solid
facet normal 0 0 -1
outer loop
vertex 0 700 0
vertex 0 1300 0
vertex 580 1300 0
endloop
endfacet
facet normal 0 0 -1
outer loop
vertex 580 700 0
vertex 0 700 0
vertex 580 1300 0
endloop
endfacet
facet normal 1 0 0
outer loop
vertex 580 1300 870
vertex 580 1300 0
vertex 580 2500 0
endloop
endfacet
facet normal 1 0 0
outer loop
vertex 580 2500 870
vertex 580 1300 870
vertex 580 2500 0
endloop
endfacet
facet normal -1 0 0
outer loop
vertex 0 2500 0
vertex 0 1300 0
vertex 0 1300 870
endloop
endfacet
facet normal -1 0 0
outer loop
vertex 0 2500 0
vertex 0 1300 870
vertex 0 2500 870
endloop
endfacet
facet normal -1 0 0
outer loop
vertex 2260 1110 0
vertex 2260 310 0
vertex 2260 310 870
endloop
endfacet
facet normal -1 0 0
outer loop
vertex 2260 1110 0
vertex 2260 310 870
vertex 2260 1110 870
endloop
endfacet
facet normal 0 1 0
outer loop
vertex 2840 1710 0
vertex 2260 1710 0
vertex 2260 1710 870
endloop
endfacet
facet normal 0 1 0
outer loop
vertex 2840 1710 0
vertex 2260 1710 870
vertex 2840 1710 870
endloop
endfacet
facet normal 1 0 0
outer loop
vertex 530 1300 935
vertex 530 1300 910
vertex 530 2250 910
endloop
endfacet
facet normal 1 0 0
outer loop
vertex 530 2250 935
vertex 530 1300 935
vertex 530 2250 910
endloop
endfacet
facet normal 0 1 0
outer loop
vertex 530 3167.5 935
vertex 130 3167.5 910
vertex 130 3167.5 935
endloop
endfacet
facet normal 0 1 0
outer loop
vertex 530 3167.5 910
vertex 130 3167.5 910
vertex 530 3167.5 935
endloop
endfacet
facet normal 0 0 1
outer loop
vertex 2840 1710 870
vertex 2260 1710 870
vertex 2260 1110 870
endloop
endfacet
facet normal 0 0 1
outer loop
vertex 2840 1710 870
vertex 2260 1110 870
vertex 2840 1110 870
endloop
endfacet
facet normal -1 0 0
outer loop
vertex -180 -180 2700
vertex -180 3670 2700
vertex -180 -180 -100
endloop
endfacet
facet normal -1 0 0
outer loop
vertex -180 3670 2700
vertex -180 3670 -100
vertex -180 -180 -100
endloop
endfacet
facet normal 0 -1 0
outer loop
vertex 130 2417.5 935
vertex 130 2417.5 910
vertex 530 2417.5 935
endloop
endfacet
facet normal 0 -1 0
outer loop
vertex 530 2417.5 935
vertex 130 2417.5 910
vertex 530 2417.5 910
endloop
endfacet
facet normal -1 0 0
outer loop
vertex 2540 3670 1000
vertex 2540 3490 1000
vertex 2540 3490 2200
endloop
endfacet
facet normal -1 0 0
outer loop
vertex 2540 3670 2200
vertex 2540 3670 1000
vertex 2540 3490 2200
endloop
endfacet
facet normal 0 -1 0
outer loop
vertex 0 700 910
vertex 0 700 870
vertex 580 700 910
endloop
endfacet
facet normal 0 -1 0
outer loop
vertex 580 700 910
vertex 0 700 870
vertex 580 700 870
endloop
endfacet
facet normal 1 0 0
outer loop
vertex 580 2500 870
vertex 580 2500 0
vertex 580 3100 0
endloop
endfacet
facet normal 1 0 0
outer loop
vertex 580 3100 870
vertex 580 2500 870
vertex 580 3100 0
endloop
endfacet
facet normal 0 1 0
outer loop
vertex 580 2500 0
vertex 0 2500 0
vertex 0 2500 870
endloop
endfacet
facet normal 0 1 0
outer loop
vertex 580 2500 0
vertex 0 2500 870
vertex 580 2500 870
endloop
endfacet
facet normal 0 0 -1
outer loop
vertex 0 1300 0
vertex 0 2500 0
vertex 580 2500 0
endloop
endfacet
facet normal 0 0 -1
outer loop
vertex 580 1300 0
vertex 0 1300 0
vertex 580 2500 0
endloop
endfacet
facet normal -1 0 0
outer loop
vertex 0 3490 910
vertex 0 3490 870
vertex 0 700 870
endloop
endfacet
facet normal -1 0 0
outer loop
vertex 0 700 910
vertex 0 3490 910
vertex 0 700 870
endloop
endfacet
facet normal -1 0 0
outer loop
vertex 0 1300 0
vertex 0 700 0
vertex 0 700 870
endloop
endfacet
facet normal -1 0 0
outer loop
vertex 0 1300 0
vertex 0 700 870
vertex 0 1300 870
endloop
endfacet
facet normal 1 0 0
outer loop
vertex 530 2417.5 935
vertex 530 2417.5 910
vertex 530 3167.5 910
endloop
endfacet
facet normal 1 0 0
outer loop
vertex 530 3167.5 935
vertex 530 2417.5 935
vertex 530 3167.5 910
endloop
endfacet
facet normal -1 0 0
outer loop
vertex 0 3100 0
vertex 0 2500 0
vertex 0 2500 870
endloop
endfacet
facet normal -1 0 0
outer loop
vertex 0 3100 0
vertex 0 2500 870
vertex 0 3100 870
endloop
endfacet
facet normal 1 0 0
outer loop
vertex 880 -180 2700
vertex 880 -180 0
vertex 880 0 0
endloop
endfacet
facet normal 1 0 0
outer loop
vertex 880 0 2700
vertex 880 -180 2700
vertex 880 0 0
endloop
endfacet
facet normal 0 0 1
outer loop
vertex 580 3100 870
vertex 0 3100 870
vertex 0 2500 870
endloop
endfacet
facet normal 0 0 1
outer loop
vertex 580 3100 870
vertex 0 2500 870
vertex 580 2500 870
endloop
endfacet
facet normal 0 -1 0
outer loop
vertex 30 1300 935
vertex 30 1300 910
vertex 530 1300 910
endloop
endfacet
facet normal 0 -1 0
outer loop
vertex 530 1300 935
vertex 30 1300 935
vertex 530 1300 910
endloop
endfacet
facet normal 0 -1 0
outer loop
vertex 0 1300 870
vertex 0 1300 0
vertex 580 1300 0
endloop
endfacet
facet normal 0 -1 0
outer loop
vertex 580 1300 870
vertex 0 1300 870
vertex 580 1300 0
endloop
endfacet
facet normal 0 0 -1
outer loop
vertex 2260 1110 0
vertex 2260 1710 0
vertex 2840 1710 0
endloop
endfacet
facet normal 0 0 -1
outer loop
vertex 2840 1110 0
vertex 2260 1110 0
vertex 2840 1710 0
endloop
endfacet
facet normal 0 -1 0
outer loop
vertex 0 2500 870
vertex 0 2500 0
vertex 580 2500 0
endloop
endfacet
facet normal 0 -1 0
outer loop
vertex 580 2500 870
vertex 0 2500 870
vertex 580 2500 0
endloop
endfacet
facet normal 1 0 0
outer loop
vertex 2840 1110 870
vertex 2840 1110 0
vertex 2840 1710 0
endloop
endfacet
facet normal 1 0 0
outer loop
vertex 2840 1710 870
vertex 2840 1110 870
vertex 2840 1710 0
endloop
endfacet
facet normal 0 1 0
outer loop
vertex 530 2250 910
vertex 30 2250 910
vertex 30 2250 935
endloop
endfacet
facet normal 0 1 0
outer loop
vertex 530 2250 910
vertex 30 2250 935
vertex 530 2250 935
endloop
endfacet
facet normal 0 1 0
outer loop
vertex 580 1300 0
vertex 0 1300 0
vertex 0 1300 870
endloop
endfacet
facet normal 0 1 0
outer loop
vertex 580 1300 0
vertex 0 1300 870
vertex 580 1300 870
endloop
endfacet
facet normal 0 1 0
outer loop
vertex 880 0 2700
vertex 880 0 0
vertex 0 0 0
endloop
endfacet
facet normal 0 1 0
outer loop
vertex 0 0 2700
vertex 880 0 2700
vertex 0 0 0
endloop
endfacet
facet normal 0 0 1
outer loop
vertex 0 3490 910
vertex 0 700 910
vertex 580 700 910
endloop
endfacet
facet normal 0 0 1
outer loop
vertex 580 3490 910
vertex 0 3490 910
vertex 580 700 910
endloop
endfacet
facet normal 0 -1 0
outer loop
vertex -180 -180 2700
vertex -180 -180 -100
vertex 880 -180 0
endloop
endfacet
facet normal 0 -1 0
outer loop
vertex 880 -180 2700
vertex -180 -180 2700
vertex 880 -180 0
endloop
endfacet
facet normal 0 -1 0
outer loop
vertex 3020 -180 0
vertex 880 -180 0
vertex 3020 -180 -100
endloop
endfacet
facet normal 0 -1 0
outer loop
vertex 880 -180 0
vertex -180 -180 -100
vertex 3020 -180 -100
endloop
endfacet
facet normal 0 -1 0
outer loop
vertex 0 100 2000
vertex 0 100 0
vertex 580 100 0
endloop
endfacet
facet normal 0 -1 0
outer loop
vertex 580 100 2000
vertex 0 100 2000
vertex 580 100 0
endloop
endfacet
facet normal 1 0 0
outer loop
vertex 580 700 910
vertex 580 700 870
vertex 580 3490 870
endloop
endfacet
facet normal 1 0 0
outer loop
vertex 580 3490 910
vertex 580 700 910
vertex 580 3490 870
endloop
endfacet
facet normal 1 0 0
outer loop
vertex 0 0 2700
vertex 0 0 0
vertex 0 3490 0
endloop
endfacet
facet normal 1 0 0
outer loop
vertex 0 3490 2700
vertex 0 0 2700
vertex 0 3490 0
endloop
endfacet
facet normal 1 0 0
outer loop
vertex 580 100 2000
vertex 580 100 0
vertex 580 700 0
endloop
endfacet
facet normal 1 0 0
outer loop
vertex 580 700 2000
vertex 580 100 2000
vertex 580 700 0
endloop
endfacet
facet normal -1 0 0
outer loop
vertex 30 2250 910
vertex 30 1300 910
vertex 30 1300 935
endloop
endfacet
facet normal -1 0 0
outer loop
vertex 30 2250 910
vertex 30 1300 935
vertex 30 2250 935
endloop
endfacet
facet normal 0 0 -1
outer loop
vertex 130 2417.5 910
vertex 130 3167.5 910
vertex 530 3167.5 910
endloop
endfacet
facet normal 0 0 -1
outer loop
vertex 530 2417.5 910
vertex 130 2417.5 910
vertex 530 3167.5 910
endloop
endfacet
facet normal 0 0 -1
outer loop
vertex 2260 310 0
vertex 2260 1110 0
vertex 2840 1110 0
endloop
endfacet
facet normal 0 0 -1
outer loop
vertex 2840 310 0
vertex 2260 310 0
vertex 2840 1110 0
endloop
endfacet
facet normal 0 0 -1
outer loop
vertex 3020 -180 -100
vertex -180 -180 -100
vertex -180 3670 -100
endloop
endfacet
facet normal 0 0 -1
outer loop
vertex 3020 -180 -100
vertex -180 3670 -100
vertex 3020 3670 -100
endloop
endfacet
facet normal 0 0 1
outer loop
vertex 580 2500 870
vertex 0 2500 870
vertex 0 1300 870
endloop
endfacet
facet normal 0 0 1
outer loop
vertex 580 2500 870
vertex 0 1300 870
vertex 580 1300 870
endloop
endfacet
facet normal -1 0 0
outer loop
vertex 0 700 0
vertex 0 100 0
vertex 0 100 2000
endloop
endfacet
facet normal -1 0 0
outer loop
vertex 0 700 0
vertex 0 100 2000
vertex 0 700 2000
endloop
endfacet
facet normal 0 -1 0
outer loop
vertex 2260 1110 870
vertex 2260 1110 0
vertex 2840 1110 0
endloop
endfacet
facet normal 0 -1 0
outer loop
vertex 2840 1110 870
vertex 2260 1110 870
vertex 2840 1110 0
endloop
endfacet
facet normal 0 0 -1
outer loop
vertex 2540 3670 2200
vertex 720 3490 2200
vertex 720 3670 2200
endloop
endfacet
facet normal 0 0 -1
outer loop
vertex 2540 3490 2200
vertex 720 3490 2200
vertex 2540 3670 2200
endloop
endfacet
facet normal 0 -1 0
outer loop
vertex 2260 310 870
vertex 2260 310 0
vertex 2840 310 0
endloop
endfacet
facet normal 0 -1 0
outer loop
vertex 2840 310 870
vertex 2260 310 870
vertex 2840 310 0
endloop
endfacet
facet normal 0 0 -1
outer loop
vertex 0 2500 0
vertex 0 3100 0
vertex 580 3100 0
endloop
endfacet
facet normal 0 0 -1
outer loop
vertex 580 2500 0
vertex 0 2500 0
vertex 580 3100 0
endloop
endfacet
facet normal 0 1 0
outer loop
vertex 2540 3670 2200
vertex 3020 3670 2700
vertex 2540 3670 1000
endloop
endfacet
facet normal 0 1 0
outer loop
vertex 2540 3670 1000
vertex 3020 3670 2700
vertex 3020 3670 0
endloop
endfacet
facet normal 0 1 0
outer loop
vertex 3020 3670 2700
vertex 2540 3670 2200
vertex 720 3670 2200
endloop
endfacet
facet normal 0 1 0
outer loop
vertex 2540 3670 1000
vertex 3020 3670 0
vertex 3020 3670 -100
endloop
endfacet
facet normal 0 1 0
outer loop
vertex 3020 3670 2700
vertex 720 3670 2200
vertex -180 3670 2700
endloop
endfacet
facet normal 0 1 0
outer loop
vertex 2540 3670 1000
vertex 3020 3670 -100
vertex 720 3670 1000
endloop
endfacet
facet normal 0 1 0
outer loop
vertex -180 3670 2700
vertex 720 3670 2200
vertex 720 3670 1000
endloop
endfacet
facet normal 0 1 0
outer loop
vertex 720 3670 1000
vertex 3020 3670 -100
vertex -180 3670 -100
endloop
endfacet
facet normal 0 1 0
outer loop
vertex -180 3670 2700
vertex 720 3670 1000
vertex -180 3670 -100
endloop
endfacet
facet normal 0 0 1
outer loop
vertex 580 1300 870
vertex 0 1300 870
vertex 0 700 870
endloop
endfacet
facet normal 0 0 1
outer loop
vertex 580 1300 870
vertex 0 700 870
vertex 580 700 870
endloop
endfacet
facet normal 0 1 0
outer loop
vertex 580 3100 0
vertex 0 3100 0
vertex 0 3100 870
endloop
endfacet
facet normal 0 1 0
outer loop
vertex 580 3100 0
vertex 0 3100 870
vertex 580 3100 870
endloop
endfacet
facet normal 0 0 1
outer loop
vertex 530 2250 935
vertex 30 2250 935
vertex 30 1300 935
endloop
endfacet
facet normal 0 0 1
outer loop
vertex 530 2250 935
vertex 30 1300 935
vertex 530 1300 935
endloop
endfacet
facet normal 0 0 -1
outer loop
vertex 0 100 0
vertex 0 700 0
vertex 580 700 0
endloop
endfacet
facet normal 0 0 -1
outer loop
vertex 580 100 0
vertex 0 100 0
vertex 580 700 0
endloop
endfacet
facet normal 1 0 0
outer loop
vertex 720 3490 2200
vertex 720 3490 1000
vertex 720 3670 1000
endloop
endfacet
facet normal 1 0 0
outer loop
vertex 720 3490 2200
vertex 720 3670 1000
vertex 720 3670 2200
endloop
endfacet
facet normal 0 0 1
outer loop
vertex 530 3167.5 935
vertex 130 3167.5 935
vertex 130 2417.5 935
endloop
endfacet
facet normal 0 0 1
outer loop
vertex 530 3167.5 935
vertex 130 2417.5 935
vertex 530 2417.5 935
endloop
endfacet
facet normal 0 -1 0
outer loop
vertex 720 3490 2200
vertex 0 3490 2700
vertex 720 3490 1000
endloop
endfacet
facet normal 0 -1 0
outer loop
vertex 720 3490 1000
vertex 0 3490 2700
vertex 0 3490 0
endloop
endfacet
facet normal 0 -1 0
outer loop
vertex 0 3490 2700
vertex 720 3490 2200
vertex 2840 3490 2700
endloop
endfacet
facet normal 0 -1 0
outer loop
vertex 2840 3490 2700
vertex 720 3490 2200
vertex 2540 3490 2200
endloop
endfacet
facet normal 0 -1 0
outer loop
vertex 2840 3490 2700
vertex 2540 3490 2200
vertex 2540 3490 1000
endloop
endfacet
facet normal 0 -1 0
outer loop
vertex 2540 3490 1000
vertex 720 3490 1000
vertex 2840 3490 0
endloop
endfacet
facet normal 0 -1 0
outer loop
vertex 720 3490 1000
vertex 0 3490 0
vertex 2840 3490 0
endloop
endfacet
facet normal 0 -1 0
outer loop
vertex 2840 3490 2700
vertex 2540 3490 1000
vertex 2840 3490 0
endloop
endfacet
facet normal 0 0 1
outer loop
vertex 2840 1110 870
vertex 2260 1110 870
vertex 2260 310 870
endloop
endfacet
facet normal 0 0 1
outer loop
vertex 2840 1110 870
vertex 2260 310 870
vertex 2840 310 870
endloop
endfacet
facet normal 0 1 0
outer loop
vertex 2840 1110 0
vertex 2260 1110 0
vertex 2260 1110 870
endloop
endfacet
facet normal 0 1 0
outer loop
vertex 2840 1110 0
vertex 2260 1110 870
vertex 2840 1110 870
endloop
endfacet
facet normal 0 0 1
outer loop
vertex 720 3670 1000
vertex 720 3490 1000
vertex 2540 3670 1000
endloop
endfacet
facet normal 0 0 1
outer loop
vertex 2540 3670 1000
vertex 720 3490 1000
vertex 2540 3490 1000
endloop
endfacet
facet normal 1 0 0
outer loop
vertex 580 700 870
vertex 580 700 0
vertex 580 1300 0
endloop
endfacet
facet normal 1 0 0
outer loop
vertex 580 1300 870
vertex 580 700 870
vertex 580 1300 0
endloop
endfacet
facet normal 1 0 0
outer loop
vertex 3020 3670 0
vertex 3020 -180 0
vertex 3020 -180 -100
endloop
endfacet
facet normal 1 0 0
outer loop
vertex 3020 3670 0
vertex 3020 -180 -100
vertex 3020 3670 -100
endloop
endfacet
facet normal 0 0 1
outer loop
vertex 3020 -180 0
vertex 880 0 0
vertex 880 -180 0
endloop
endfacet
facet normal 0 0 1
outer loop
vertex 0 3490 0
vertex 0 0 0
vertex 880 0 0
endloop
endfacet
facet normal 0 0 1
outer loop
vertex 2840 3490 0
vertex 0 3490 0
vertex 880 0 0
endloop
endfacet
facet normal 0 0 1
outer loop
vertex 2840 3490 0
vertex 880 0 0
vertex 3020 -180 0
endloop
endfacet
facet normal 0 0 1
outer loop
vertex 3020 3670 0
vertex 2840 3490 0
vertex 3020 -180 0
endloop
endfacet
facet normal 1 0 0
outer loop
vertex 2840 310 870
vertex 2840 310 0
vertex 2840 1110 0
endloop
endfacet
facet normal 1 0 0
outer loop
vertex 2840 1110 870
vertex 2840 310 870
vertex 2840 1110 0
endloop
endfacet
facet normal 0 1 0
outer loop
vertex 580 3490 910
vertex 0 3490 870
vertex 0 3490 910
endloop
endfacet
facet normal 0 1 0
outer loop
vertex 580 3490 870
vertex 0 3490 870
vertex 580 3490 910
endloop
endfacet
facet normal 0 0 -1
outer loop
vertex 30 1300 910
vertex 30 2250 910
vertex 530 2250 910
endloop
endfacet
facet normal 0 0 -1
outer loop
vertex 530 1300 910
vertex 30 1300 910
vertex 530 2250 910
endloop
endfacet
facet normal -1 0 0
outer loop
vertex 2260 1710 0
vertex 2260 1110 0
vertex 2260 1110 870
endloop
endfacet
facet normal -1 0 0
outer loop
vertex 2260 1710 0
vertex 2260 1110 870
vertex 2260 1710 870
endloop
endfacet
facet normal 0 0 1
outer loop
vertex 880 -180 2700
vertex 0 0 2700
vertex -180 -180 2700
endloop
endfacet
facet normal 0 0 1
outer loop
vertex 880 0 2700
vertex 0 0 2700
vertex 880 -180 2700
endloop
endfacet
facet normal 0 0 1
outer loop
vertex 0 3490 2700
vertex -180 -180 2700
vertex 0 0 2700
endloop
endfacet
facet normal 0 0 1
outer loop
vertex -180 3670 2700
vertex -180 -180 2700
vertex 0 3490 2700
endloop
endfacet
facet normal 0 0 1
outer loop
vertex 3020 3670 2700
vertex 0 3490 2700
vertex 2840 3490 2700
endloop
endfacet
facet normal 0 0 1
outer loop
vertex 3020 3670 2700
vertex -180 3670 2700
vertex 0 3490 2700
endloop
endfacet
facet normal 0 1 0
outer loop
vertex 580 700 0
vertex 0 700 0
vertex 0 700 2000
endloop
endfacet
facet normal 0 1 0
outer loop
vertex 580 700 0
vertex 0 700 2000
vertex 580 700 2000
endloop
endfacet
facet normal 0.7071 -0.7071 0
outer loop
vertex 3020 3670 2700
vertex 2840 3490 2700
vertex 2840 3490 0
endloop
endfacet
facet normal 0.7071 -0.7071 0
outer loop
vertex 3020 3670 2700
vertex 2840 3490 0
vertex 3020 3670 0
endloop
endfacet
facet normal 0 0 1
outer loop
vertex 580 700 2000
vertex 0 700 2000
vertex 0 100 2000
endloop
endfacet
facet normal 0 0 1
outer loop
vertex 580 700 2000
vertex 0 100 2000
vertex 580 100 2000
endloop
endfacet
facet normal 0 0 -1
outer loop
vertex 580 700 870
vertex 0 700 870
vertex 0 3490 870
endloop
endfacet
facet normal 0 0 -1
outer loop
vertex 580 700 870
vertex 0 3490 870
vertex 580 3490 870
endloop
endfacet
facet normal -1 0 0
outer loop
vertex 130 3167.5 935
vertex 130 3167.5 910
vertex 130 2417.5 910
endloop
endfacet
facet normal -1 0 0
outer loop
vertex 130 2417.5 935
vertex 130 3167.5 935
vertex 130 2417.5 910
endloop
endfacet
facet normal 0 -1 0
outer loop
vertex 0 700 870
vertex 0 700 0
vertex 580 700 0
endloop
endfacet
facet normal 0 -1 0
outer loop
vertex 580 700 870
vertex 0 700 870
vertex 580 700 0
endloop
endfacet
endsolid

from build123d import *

# Parameters (mm, degrees)
F1_DEPTH  = 100
F2_DEPTH  = 2700
F3_W      = 580
F3_H      = 600
F4_DEPTH  = 2000
F5_DEPTH  = 870
F3_H_2    = 1200
F6_DEPTH  = 870
F7_DEPTH  = 870
F8_W      = 580
F8_H      = 990
F8_H_2    = 1200
F8_H_3    = 600
F9_DEPTH  = 40
F10_W     = 400
F10_H     = 67.5
F10_H_2   = 600
F10_H_3   = 82.5
F11_DEPTH = 25
F12_W     = 500
F12_H     = 950
F13_DEPTH = 25
F14_W     = 580
F14_H     = 800
F15_DEPTH = 870
F14_H_2   = 600
F16_DEPTH = 870
F17_W     = 1820
F17_H     = 1200
F18_DEPTH = 180.001


with BuildPart() as f1:
    # F0 (on Top) → F1 (new body)
    with BuildSketch(Plane.XY):
        Polygon((880, 0), (0, 0), (0, 3490), (2840, 3490), (3020, 3670), (-180, 3670), (-180, -180), (880, -180), align=None)
        Polygon((0, 3490), (0, 0), (880, 0), (2840, 0), (2840, 3490), align=None)
        Polygon((2840, 0), (880, 0), (880, -180), (3020, -180), (3020, 3670), (2840, 3490), align=None)
    extrude(amount=-F1_DEPTH)

    # F0 (on Top) → F2 (join)
    with BuildSketch(Plane.XY):
        Polygon((880, 0), (0, 0), (0, 3490), (2840, 3490), (3020, 3670), (-180, 3670), (-180, -180), (880, -180), align=None)
    extrude(amount=F2_DEPTH)

    # F17 (on face) → F18 (cut, through all)
    with BuildSketch(Plane.XZ.offset(-3490)):
        with Locations((1630, 1600)):
            Rectangle(F17_W, F17_H)
    extrude(amount=-F18_DEPTH, mode=Mode.SUBTRACT)


with BuildPart() as f4:
    # F3 (on face) → F4 (new body)
    with BuildSketch(Plane.XY):
        with Locations((290, 400)):
            Rectangle(F3_W, F3_H)
    extrude(amount=F4_DEPTH)


with BuildPart() as f5:
    # F3 (on face) → F5 (new body)
    with BuildSketch(Plane.XY):
        with Locations((290, 1000)):
            Rectangle(F3_W, F3_H)
    extrude(amount=F5_DEPTH)


with BuildPart() as f6:
    # F3 (on face) → F6 (new body)
    with BuildSketch(Plane.XY):
        with Locations((290, 1900)):
            Rectangle(F3_W, F3_H_2)
    extrude(amount=F6_DEPTH)


with BuildPart() as f7:
    # F3 (on face) → F7 (new body)
    with BuildSketch(Plane.XY):
        with Locations((290, 2800)):
            Rectangle(F3_W, F3_H)
    extrude(amount=F7_DEPTH)


with BuildPart() as f9:
    # F8 (on face) → F9 (new body)
    with BuildSketch(Plane.XY.offset(870)):
        with Locations((290, 2995)):
            Rectangle(F8_W, F8_H)
        with Locations((290, 1900)):
            Rectangle(F8_W, F8_H_2)
        with Locations((290, 1000)):
            Rectangle(F8_W, F8_H_3)
    extrude(amount=F9_DEPTH)


with BuildPart() as f11:
    # F10 (on face) → F11 (new body)
    with BuildSketch(Plane.XY.offset(910)):
        with Locations((330, 3133.75)):
            Rectangle(F10_W, F10_H)
        with Locations((330, 2800)):
            Rectangle(F10_W, F10_H_2)
        with Locations((330, 2458.75)):
            Rectangle(F10_W, F10_H_3)
    extrude(amount=F11_DEPTH)


with BuildPart() as f13:
    # F12 (on face) → F13 (new body)
    with BuildSketch(Plane.XY.offset(910)):
        with Locations((280, 1775)):
            Rectangle(F12_W, F12_H)
    extrude(amount=F13_DEPTH)


with BuildPart() as f15:
    # F14 (on face) → F15 (new body)
    with BuildSketch(Plane.XY):
        with Locations((2550, 710)):
            Rectangle(F14_W, F14_H)
    extrude(amount=F15_DEPTH)


with BuildPart() as f16:
    # F14 (on face) → F16 (new body)
    with BuildSketch(Plane.XY):
        with Locations((2550, 1410)):
            Rectangle(F14_W, F14_H_2)
    extrude(amount=F16_DEPTH)


solid = Compound([f1.part, f4.part, f5.part, f6.part, f7.part, f9.part, f11.part, f13.part, f15.part, f16.part])
